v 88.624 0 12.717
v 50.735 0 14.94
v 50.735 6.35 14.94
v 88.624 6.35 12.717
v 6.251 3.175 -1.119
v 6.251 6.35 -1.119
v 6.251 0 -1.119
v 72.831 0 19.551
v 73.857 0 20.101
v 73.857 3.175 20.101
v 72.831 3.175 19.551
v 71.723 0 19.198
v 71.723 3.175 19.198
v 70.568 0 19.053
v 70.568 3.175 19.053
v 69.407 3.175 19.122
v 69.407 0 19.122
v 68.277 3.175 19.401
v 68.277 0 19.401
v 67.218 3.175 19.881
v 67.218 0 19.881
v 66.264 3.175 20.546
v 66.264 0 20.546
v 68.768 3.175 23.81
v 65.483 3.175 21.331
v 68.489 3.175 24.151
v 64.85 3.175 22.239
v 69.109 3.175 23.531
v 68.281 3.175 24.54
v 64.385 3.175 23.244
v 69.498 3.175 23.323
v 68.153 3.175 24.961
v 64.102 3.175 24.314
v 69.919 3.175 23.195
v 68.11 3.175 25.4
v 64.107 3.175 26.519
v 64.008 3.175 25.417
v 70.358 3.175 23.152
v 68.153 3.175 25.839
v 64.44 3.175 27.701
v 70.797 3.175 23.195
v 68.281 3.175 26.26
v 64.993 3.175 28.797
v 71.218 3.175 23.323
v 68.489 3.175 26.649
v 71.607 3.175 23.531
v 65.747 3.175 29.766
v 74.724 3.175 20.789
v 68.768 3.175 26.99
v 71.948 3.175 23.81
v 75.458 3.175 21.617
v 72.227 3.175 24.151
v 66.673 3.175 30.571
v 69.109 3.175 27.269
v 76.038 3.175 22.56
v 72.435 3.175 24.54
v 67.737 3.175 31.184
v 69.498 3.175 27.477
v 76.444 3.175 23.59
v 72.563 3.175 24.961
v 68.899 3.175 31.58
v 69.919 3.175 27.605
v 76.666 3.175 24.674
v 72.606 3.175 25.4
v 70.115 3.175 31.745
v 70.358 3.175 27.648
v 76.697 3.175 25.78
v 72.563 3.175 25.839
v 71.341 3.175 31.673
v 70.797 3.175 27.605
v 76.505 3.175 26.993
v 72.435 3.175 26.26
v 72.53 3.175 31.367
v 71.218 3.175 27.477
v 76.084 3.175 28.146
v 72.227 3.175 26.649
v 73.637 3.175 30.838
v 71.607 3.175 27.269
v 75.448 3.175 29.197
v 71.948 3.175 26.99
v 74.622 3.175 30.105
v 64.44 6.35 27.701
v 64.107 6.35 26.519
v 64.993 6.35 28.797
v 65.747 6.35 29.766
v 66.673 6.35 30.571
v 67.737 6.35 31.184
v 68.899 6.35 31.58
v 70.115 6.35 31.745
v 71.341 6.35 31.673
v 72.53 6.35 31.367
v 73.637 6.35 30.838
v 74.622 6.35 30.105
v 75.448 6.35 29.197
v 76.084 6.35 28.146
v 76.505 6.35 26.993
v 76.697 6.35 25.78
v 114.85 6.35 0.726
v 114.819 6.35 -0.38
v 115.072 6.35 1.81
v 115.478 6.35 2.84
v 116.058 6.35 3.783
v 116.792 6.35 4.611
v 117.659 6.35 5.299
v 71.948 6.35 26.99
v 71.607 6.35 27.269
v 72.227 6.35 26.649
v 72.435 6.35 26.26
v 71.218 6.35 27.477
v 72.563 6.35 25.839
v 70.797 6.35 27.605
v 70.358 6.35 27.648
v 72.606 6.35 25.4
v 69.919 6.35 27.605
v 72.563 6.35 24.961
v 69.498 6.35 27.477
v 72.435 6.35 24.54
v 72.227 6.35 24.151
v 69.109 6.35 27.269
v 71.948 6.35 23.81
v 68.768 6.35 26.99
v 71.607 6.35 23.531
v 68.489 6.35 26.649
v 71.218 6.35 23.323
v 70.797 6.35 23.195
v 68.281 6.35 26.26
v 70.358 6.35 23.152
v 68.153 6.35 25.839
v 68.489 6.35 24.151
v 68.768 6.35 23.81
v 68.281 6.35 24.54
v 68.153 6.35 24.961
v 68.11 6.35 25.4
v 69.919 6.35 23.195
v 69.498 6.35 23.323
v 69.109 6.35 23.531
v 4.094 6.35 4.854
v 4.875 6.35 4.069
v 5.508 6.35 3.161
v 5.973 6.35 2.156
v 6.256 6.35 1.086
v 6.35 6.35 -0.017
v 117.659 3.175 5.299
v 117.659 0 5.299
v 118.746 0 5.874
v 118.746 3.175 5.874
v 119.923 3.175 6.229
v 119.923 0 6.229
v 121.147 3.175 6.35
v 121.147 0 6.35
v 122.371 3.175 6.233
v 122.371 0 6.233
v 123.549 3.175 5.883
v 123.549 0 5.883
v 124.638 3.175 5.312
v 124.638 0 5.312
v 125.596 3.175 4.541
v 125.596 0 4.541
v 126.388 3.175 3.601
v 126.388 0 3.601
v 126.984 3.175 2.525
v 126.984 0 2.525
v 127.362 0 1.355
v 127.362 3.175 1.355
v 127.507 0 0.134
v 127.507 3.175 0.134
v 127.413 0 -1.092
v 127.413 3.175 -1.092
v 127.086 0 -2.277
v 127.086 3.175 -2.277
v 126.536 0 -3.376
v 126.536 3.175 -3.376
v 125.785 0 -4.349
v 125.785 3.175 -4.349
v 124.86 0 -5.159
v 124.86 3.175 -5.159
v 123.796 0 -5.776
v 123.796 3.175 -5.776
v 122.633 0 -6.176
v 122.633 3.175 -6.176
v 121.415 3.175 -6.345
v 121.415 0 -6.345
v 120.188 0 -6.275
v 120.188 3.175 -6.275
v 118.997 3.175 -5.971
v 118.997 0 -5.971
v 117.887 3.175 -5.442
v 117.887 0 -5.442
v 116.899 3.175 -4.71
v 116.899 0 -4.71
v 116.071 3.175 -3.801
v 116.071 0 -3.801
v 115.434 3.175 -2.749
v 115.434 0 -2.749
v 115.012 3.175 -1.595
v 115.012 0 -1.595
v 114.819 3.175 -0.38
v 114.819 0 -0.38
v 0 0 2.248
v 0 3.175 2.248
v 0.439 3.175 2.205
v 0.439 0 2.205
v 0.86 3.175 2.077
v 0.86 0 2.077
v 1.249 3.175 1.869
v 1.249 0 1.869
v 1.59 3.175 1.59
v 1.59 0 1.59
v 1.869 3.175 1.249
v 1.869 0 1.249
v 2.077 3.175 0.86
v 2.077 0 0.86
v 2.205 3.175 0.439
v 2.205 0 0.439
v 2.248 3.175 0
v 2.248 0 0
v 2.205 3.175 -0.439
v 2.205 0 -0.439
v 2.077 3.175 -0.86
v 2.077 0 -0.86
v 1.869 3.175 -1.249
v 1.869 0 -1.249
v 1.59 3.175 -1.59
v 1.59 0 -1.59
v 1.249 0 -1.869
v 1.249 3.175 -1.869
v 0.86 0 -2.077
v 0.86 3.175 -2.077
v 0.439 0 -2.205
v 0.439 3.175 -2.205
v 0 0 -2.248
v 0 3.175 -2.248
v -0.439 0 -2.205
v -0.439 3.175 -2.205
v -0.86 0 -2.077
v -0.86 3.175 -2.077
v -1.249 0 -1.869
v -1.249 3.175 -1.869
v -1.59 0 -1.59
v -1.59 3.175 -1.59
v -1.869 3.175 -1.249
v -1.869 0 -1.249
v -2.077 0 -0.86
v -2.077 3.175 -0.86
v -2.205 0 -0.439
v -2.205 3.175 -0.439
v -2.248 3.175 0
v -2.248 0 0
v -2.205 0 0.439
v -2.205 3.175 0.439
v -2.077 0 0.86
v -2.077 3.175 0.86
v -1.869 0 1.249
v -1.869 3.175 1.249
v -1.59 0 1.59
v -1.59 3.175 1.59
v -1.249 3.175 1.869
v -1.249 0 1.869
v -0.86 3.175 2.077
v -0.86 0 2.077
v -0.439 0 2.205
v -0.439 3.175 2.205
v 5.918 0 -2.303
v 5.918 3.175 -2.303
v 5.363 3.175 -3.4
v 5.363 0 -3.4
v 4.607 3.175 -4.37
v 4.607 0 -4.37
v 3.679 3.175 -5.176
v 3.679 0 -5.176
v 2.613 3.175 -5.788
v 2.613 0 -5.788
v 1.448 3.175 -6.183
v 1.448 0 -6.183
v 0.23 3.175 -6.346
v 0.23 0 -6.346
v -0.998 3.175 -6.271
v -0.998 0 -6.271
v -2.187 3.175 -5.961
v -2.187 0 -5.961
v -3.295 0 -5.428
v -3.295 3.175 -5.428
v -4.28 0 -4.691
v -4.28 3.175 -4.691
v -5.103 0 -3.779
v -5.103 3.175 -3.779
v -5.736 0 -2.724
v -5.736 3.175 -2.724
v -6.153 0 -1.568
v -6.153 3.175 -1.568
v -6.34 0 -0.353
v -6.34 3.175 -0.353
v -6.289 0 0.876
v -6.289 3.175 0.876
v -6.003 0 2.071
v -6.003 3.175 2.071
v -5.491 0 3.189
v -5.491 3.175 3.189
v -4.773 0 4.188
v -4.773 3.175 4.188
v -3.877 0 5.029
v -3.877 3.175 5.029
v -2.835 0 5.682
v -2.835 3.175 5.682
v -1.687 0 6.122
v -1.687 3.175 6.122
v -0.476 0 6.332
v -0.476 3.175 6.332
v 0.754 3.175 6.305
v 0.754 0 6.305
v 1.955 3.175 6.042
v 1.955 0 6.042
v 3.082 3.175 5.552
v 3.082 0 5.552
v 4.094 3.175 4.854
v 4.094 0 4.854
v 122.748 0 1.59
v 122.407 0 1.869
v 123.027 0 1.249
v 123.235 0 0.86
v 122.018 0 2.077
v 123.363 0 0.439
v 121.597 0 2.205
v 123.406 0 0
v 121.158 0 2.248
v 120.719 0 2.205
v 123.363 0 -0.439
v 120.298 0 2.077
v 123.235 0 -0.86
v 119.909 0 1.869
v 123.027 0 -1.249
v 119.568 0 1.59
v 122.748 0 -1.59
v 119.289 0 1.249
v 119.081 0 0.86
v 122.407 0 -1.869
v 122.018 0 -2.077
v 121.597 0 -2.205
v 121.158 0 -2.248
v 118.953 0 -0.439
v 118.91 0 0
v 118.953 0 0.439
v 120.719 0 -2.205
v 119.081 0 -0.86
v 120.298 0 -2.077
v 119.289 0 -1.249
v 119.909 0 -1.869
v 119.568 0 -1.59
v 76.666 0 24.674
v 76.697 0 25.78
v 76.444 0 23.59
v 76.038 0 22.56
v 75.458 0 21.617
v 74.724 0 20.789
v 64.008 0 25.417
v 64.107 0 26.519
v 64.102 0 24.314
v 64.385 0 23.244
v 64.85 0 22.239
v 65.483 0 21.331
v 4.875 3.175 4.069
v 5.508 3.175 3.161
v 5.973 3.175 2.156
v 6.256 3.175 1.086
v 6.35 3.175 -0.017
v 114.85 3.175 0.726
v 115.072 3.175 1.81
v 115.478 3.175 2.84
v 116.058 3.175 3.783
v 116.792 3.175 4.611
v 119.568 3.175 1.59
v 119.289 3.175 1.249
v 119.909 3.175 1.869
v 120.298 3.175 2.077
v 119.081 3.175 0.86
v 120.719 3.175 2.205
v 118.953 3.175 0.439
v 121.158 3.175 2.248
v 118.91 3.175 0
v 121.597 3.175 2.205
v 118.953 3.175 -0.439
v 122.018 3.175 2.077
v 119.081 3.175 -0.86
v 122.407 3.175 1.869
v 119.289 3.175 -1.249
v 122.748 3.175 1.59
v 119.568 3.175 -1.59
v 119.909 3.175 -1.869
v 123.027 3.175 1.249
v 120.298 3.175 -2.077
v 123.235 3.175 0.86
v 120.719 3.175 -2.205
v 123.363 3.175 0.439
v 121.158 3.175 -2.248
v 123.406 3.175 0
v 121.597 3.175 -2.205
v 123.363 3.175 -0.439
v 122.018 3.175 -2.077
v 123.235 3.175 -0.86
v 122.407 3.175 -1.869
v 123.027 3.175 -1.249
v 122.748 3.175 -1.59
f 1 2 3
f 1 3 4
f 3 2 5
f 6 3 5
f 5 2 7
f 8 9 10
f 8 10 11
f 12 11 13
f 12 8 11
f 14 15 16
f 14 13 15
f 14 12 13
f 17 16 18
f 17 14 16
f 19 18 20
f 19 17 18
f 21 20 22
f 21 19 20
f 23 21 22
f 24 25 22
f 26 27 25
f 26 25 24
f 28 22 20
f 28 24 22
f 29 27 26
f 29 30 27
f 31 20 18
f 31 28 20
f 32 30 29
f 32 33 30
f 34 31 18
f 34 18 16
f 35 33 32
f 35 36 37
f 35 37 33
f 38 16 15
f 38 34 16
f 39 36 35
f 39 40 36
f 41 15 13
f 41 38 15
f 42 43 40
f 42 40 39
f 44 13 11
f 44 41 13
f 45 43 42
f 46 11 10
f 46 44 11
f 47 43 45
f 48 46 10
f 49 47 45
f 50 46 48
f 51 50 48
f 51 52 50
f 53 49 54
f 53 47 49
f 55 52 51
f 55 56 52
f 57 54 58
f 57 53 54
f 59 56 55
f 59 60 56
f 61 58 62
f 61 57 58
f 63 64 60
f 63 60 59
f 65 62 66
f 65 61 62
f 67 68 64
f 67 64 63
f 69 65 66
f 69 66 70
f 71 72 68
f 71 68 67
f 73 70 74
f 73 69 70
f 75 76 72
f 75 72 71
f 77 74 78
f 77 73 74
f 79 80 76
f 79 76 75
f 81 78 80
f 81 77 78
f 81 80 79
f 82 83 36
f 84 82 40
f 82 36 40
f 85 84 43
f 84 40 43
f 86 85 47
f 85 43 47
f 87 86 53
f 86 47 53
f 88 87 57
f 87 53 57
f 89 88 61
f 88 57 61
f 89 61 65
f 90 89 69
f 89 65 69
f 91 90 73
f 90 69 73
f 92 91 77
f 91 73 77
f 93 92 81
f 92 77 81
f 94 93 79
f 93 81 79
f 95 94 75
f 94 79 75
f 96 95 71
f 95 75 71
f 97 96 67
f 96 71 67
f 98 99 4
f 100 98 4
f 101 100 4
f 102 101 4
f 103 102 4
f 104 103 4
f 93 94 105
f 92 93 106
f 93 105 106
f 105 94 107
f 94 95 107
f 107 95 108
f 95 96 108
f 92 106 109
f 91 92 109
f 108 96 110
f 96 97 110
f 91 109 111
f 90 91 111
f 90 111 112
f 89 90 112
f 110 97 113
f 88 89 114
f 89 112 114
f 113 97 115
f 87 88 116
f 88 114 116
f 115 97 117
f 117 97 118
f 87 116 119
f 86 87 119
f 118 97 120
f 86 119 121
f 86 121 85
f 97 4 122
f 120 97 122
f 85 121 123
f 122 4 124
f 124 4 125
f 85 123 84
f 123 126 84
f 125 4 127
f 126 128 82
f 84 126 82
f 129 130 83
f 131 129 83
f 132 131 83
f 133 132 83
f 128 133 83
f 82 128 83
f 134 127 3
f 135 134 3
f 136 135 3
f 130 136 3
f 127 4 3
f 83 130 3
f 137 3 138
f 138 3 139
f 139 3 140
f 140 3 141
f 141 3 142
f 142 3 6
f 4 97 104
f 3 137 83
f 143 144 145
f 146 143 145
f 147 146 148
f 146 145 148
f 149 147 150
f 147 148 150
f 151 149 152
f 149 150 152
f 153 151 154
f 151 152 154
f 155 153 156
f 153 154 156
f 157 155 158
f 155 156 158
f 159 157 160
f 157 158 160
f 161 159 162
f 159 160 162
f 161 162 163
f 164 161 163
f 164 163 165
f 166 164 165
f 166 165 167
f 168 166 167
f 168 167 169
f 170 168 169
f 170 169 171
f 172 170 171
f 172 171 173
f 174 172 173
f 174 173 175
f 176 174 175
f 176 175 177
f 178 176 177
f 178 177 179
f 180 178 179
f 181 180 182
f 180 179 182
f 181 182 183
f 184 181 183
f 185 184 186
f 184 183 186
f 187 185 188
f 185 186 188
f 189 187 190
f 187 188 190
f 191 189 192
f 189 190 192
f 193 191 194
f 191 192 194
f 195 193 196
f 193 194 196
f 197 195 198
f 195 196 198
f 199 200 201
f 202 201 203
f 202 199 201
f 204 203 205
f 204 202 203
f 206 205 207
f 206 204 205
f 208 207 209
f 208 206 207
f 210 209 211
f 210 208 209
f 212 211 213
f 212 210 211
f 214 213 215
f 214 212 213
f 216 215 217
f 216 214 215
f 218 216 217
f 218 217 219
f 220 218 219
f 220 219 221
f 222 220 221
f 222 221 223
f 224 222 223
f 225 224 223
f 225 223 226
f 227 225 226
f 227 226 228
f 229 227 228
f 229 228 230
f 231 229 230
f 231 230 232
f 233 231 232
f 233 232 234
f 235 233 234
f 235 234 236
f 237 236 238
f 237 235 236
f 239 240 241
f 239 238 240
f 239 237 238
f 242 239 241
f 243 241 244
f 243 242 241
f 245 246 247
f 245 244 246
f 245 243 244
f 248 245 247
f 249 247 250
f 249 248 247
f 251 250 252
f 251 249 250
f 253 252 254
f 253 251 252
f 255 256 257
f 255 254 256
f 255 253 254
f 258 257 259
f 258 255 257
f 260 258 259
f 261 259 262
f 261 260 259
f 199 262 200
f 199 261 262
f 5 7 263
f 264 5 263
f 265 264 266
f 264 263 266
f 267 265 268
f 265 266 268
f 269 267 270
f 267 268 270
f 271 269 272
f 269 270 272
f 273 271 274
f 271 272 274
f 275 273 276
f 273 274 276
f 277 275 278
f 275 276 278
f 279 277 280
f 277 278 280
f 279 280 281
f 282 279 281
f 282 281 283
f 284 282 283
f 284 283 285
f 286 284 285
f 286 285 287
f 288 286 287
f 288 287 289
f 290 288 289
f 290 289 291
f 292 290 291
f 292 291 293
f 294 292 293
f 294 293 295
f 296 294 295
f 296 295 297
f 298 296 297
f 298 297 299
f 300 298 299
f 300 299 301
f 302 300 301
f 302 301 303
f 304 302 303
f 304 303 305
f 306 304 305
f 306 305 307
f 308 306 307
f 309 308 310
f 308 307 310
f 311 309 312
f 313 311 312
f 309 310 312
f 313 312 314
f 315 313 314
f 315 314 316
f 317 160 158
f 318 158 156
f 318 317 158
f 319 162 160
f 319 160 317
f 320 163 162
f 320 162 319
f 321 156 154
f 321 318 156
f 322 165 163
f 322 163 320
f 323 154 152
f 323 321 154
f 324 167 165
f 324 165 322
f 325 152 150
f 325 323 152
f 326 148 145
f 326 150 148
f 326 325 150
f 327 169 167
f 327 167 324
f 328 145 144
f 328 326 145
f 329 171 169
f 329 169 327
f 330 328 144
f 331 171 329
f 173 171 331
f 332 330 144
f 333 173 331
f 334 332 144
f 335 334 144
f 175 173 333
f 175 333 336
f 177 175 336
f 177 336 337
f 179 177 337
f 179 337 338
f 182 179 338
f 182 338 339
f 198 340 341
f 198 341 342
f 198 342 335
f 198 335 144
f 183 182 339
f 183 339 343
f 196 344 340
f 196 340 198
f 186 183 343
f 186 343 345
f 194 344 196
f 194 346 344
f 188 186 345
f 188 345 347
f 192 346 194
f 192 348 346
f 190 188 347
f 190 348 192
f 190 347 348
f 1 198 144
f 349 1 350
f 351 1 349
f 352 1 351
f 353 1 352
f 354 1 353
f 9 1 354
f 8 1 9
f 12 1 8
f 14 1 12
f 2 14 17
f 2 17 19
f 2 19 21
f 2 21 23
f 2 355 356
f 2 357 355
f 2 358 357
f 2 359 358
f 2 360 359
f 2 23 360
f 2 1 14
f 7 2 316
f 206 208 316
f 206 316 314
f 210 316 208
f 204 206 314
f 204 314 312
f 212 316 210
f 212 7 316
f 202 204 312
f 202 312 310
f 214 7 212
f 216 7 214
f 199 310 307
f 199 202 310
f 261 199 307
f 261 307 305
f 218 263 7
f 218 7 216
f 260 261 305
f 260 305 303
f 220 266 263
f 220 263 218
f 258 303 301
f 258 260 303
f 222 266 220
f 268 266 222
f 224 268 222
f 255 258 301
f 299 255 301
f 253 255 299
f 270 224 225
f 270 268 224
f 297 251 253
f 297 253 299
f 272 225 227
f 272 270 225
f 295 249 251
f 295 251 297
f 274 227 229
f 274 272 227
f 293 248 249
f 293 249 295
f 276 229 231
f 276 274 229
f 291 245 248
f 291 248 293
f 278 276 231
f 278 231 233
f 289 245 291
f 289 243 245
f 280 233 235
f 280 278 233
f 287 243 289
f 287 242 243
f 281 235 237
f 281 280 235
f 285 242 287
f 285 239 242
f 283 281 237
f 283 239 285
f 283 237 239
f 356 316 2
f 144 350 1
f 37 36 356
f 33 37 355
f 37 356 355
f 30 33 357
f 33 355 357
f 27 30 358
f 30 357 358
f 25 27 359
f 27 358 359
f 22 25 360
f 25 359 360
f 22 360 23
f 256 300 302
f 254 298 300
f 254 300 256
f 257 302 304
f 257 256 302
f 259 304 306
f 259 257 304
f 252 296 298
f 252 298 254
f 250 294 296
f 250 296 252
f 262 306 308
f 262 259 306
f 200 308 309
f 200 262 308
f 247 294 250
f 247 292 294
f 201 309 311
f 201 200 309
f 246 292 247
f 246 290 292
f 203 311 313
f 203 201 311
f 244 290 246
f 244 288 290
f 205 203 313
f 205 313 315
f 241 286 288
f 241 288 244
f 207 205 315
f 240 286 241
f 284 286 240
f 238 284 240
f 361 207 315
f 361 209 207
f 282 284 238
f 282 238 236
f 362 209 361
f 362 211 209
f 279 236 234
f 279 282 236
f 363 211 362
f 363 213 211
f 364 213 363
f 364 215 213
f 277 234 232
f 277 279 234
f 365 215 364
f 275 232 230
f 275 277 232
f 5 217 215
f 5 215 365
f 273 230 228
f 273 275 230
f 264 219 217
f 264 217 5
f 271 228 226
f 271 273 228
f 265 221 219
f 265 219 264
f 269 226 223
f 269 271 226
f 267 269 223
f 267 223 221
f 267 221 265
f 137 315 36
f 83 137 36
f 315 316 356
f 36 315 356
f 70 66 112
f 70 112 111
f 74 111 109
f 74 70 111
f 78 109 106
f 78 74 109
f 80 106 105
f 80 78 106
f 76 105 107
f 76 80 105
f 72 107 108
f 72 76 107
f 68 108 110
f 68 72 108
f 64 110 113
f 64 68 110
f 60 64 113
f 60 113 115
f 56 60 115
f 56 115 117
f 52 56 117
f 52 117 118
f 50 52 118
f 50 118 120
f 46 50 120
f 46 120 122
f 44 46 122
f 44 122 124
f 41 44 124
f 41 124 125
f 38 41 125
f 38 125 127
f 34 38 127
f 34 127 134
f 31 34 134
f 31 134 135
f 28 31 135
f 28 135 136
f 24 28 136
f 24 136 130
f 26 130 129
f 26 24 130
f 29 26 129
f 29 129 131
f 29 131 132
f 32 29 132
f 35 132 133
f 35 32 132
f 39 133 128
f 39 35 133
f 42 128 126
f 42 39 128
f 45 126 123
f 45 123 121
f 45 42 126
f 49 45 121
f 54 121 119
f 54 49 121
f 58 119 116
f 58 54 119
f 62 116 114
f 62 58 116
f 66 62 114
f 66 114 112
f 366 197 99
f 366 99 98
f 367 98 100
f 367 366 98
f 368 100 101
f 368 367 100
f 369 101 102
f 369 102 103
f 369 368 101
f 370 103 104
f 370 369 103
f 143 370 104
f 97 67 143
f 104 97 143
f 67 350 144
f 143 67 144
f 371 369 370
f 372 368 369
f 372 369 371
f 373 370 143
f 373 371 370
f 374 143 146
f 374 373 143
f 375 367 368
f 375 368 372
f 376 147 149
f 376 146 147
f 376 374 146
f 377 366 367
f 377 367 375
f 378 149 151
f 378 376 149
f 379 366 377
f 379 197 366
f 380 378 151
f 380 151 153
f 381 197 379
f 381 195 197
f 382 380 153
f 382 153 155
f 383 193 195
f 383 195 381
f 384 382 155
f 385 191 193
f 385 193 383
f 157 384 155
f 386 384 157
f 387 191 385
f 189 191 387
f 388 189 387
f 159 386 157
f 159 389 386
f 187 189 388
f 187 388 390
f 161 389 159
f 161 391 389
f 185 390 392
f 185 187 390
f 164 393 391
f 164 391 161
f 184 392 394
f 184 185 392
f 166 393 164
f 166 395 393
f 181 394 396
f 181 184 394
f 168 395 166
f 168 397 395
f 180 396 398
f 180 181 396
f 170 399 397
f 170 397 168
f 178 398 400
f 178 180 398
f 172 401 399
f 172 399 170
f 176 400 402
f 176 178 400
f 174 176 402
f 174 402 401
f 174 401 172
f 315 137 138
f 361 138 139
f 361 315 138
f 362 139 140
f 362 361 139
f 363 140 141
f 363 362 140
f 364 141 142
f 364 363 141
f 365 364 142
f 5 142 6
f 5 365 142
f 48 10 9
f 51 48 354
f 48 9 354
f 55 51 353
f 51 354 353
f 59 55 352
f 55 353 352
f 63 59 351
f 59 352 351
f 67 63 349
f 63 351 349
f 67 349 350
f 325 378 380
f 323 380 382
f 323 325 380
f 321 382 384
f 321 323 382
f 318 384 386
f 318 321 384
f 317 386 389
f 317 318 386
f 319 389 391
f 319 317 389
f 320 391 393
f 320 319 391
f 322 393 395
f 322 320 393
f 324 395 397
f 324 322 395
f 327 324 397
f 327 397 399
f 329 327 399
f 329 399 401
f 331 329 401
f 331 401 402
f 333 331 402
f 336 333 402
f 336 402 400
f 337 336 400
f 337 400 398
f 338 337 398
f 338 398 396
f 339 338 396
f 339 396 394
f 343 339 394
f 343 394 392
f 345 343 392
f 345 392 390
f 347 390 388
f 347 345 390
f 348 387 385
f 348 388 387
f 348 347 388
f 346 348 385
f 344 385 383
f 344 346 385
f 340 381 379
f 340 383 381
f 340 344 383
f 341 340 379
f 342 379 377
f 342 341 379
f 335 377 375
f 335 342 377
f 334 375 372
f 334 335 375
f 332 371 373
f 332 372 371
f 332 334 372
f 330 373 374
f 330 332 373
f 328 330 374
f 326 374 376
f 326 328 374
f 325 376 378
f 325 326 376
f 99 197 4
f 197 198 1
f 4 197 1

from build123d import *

# Parameters (mm, degrees)
SKETCH2_R           = 2.2479
BOSS_EXTRUDE2_DEPTH = 6.35
CUT_EXTRUDE1_START  = -3.175
SKETCH3_R           = 6.35
CUT_EXTRUDE1_DEPTH  = 3.175
SKETCH4_R           = 6.35
CUT_EXTRUDE2_DEPTH  = 3.175
BOSS_EXTRUDE3_START = -6.35
BOSS_EXTRUDE3_DEPTH = 6.35


with BuildPart() as part:
    # Sketch2 → Boss-Extrude2 (new body)
    with BuildSketch(Plane(origin=(0, 0, 0), x_dir=(1, 0, 0), z_dir=(0, 1, 0))):
        with BuildLine():
            Line((76.696592015, -25.780461907), (117.659214316, -5.299150756))
            ThreePointArc((117.659214316, -5.299150756), (126.837612663, 2.839806331), (114.819407985, 0.380461907))
            Line((114.819407985, 0.380461907), (73.856785684, -20.100849244))
            ThreePointArc((73.856785684, -20.100849244), (69.986110983, -19.060899231), (66.263588885, -20.546310927))
            Line((66.263588885, -20.546310927), (6.250623597, 1.119019502))
            ThreePointArc((6.250623597, 1.119019502), (-5.972708576, 2.156212482), (4.094411115, -4.853689073))
            Line((4.094411115, -4.853689073), (64.107376403, -26.519019502))
            ThreePointArc((64.107376403, -26.519019502), (70.729889017, -31.739100769), (76.696592015, -25.780461907))
        make_face()
        with Locations(Location((70.358, -25.4, 0), (0, 0, 270))):
            Circle(SKETCH2_R, mode=Mode.SUBTRACT)
        with Locations(Location((0, 0, 0), (0, 0, 270))):
            Circle(SKETCH2_R, mode=Mode.SUBTRACT)
        with Locations(Location((121.158, 0, 0), (0, 0, 270))):
            Circle(SKETCH2_R, mode=Mode.SUBTRACT)
    extrude(amount=BOSS_EXTRUDE2_DEPTH)

    # Sketch3 → Cut-Extrude1 (cut)
    with BuildSketch(Plane(origin=(0, 6.35, 0), x_dir=(1, 0, 0), z_dir=(0, 1, 0)).offset(CUT_EXTRUDE1_START)):
        Circle(SKETCH3_R)
        with Locations((121.158, 0)):
            Circle(SKETCH3_R)
    extrude(amount=CUT_EXTRUDE1_DEPTH, mode=Mode.SUBTRACT)

    # Sketch4 → Cut-Extrude2 (cut)
    with BuildSketch(Plane.XZ):
        with Locations((70.358, 25.4)):
            Circle(SKETCH4_R)
    extrude(amount=-CUT_EXTRUDE2_DEPTH, mode=Mode.SUBTRACT)

    # Sketch5 → Boss-Extrude3 (add)
    with BuildSketch(Plane(origin=(0, 6.35, 0), x_dir=(1, 0, 0), z_dir=(0, 1, 0)).offset(BOSS_EXTRUDE3_START)):
        with BuildLine():
            Line((88.623778607, -12.717352782), (73.856785684, -20.100849244))
            ThreePointArc((73.856785684, -20.100849244), (69.986110983, -19.060899231), (66.263588885, -20.546310927))
            Line((66.263588885, -20.546310927), (50.734546588, -14.940158473))
            Line((50.734546588, -14.940158473), (88.623778607, -12.717352782))
        make_face()
    extrude(amount=BOSS_EXTRUDE3_DEPTH)


solid = part.part
